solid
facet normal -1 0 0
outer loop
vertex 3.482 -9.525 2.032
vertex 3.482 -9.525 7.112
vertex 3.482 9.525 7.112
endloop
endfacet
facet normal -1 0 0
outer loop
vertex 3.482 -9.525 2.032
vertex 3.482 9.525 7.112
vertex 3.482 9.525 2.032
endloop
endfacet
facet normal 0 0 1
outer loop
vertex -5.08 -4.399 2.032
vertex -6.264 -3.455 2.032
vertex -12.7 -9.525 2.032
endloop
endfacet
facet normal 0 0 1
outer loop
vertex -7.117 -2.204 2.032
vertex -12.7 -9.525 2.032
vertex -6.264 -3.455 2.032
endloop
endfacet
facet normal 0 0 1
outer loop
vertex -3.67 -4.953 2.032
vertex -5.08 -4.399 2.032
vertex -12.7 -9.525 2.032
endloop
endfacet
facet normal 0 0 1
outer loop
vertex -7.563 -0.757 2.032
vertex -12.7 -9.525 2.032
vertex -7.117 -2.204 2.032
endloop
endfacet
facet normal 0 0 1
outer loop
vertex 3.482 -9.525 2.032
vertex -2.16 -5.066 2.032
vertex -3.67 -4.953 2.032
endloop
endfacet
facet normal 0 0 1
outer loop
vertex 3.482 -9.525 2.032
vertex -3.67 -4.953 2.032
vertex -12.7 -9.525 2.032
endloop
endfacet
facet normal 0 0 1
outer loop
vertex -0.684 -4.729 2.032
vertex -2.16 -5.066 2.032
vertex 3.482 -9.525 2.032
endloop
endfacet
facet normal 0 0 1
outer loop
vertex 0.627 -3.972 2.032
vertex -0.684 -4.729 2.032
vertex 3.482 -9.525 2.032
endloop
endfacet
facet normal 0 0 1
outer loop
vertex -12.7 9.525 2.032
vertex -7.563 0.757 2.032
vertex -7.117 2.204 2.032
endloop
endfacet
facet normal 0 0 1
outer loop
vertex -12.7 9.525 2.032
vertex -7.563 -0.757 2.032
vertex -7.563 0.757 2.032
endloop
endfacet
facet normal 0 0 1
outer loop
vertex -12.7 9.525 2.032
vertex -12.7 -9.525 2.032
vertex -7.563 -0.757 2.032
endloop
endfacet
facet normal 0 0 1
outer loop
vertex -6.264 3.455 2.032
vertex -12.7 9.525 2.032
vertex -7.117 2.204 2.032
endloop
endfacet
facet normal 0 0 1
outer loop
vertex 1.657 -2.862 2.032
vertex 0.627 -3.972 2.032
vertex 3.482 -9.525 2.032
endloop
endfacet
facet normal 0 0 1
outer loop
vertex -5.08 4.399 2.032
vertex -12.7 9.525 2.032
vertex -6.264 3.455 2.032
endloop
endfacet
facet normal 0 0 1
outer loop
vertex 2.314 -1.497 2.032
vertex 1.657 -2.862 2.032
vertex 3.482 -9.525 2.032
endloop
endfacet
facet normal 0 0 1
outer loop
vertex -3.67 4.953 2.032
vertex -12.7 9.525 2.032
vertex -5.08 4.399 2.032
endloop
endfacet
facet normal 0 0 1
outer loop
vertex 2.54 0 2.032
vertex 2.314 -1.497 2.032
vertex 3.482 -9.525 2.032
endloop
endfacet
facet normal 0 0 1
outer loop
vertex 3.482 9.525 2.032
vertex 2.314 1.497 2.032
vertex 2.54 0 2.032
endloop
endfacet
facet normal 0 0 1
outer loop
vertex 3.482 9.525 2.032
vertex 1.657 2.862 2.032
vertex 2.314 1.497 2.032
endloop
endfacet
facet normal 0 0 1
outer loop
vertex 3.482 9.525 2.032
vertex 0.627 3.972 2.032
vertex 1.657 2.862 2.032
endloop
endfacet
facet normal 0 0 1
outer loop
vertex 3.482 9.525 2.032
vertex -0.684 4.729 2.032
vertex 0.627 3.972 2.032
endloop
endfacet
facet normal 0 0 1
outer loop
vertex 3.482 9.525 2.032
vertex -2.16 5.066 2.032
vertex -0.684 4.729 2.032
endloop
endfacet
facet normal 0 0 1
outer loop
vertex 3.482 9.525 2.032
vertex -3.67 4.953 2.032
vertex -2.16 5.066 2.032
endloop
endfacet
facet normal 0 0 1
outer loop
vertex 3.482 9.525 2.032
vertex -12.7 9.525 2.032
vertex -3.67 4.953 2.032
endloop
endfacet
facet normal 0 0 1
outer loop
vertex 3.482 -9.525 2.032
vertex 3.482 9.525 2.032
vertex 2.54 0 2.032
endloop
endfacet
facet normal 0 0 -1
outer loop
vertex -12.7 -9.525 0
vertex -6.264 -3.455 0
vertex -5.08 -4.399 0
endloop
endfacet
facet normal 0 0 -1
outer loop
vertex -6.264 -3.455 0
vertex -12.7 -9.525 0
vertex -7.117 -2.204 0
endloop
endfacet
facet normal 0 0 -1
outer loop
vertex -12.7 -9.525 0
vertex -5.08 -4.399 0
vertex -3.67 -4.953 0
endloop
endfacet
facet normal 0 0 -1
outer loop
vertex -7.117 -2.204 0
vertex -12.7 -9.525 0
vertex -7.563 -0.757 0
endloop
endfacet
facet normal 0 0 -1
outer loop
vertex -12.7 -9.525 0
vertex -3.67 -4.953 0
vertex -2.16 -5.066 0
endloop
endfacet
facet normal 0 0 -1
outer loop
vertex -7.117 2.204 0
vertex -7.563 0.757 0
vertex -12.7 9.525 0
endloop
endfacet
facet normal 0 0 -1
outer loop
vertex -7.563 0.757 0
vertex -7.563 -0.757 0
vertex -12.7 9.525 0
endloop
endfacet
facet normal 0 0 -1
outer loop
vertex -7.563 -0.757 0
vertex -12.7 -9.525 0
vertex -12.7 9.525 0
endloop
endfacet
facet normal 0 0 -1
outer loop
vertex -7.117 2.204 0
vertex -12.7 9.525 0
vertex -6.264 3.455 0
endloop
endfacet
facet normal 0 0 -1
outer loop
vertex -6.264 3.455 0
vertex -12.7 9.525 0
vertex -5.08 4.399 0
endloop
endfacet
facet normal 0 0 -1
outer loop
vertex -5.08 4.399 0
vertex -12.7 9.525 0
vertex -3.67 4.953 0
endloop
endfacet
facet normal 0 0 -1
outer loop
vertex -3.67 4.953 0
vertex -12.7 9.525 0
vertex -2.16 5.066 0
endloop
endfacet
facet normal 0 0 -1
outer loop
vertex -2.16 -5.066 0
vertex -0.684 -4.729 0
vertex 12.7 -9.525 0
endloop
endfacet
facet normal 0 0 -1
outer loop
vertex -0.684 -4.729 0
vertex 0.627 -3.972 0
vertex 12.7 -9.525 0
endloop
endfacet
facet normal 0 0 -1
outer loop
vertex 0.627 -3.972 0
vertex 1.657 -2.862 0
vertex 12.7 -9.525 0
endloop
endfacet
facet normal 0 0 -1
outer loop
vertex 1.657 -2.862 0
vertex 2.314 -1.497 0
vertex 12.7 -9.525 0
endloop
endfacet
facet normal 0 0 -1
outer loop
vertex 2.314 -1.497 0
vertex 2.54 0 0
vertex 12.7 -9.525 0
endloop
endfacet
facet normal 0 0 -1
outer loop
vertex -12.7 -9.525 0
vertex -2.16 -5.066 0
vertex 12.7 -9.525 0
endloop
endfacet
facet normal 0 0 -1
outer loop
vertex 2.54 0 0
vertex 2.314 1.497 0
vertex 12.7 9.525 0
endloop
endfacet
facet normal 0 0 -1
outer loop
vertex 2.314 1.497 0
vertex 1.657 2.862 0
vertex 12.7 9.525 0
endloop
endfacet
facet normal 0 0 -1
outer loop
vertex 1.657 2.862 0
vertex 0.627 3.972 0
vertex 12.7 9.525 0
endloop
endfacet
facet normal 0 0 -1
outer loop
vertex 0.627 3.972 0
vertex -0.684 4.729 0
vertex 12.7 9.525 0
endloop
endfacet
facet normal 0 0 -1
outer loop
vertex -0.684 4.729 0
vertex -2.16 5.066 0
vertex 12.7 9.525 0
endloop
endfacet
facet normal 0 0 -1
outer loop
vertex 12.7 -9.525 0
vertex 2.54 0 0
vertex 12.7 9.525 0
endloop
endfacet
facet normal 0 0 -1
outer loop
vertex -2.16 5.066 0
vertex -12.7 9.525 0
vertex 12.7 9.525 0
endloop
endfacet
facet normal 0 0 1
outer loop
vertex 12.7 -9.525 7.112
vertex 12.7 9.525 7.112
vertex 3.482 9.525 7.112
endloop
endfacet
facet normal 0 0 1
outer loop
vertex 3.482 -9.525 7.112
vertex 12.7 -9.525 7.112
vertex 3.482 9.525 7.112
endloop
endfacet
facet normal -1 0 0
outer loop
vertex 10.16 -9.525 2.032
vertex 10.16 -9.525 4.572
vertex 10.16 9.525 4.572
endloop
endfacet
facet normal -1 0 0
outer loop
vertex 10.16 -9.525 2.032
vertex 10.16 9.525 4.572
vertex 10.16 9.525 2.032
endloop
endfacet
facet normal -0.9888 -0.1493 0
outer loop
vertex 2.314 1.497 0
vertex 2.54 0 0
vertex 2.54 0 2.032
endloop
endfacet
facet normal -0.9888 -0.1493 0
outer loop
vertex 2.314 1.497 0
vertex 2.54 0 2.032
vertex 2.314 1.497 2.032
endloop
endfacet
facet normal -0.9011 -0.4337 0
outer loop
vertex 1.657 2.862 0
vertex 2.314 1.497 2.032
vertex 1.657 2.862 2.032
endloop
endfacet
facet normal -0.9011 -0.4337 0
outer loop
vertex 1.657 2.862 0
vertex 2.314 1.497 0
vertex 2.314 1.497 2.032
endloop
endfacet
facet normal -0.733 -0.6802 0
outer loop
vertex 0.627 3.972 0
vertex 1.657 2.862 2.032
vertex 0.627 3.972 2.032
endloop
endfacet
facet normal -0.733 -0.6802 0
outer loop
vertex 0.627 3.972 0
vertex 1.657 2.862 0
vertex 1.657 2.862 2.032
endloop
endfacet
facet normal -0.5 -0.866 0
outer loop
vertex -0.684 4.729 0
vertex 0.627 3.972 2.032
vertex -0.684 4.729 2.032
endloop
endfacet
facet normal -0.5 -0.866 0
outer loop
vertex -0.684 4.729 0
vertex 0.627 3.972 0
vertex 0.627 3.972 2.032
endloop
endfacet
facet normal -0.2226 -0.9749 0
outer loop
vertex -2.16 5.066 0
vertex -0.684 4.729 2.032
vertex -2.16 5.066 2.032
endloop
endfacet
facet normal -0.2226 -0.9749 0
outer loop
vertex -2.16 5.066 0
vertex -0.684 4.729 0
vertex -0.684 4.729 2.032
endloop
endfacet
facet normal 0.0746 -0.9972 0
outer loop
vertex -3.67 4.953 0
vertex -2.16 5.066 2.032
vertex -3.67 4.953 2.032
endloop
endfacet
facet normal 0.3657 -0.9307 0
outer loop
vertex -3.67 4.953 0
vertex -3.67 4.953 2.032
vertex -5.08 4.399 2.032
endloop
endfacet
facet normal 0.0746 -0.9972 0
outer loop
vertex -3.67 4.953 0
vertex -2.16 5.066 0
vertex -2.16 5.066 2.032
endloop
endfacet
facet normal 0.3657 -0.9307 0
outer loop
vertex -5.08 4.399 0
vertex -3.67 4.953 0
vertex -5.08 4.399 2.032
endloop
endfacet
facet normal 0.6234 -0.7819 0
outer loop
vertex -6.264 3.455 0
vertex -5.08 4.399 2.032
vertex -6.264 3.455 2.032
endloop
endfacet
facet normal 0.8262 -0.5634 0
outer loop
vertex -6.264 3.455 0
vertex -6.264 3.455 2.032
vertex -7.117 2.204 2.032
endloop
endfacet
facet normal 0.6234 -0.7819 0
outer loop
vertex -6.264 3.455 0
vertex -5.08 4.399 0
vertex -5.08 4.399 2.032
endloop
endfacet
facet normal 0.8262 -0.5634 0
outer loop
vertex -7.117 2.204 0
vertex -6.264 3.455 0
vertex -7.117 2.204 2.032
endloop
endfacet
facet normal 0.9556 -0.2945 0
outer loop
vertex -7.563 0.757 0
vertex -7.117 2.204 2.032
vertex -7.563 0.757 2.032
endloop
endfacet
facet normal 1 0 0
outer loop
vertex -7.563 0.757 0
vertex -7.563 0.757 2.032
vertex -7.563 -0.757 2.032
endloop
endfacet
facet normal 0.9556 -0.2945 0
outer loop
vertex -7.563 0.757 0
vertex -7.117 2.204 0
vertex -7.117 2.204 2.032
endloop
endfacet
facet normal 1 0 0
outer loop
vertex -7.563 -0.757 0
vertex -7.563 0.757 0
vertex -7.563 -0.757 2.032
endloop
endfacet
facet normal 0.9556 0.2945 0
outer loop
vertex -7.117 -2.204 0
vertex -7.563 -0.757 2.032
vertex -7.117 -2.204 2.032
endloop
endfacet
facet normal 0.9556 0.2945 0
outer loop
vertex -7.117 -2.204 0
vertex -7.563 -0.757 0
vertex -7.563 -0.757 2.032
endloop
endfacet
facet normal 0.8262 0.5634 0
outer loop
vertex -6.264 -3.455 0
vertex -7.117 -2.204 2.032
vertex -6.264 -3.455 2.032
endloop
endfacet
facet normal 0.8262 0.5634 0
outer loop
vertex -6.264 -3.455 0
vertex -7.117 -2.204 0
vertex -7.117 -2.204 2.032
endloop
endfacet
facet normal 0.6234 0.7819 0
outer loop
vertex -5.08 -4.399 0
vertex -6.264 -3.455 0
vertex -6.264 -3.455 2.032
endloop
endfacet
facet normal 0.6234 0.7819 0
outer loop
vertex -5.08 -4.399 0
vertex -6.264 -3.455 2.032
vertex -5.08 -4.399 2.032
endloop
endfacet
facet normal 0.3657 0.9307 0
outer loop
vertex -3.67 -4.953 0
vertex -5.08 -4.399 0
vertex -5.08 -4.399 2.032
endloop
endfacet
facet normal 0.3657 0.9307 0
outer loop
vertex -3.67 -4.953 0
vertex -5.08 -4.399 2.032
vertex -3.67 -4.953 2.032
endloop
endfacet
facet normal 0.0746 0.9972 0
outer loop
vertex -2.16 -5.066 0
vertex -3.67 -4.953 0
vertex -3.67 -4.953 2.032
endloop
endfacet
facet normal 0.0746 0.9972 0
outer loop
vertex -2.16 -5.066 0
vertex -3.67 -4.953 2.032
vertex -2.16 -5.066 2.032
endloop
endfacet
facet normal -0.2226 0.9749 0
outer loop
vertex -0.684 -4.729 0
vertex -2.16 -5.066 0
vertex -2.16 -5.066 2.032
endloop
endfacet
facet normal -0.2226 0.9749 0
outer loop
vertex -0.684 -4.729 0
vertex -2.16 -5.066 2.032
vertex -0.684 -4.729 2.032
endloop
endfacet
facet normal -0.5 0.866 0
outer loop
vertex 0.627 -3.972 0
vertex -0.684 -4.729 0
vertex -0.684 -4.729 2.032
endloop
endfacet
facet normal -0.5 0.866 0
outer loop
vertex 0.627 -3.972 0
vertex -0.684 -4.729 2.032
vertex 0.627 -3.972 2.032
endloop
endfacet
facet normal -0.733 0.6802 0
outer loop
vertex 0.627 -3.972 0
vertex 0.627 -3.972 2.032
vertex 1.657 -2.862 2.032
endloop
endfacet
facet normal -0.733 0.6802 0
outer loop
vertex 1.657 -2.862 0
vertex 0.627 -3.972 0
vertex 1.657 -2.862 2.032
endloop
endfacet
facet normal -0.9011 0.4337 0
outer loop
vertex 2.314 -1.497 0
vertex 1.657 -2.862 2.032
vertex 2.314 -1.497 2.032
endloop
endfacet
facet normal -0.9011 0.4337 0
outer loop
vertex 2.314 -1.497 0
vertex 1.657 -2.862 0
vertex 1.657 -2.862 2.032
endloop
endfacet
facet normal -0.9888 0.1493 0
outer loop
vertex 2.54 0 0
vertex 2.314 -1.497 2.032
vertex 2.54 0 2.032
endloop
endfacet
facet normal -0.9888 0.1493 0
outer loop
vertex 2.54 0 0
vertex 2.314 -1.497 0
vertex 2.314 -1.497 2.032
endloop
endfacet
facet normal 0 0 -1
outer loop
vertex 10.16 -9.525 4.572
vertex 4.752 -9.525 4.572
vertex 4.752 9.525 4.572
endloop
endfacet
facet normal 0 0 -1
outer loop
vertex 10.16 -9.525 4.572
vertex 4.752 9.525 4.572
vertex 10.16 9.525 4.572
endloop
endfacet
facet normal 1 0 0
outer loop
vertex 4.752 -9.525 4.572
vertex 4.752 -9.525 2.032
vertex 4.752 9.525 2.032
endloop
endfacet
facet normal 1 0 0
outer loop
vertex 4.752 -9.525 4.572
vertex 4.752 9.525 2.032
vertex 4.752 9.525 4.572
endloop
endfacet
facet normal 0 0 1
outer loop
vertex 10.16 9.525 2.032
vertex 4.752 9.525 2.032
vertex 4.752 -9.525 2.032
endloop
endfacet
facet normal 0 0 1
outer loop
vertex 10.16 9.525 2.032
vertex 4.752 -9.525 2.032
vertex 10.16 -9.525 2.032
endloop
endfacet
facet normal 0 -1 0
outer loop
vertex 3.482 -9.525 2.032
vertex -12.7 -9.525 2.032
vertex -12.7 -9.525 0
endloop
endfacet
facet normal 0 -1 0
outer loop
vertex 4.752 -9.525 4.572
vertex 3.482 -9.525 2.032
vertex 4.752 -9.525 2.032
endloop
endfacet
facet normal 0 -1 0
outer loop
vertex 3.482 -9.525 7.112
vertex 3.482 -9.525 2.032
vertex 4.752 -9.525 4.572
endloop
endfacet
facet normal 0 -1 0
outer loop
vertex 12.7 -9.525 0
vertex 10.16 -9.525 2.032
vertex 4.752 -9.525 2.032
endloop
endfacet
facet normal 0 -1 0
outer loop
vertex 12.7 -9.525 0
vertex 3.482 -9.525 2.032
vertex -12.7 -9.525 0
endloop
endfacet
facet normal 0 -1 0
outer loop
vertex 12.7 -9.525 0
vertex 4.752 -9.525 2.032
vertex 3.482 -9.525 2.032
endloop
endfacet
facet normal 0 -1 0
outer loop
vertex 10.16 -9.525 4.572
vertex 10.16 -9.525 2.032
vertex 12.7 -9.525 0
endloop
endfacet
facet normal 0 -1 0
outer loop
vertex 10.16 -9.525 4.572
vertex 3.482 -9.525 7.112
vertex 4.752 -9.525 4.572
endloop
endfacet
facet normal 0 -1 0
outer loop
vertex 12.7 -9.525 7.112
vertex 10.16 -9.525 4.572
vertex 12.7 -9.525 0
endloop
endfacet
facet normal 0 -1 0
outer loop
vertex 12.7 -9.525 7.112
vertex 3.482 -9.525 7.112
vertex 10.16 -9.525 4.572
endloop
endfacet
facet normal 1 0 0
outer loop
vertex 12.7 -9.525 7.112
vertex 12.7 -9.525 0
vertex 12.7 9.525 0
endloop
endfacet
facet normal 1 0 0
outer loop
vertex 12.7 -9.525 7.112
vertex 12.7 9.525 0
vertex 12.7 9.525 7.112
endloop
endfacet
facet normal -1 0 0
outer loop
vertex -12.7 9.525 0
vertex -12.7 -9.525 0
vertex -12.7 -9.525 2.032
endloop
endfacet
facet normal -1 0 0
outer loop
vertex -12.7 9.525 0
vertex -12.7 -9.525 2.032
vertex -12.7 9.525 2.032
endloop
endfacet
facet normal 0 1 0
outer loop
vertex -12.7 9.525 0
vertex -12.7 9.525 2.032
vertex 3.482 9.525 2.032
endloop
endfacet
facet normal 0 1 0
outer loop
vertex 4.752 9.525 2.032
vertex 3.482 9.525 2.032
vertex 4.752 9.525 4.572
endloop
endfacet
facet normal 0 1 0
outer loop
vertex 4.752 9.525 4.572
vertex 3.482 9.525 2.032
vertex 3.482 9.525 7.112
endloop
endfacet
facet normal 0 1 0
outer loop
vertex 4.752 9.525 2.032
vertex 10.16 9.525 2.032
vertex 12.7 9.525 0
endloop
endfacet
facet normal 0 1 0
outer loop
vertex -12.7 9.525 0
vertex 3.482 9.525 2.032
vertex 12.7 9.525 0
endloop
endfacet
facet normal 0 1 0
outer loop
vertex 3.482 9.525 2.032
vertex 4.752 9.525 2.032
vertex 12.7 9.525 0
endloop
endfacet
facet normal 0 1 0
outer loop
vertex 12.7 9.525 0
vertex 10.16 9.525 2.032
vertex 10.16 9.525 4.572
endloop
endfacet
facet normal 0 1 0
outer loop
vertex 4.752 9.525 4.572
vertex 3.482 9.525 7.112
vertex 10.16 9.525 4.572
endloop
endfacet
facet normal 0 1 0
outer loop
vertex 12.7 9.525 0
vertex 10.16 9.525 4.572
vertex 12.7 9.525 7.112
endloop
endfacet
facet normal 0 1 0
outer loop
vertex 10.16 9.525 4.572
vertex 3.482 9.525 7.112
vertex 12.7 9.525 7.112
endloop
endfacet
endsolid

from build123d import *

# Parameters (mm, degrees)
F0_W     = 25.4
F0_H     = 19.05
F0_R     = 5.08
F1_DEPTH = 2.032
F3_DEPTH = 19.05


with BuildPart() as f1:
    # F0 (on Top) → F1 (new body)
    with BuildSketch(Plane.XY):
        Rectangle(F0_W, F0_H)
        with Locations((-2.54, 0)):
            Circle(F0_R, mode=Mode.SUBTRACT)
    extrude(amount=F1_DEPTH)

    # F2 (on face) → F3 (join, through all)
    with BuildSketch(Plane.XZ.offset(9.525)):
        Polygon((10.16, 2.032), (12.7, 2.032), (12.7, 7.112), (3.482183, 7.112), (3.482183, 2.032), (4.752183, 2.032), (4.752183, 4.572), (10.16, 4.572), align=None)
    extrude(amount=-F3_DEPTH)


solid = f1.part
